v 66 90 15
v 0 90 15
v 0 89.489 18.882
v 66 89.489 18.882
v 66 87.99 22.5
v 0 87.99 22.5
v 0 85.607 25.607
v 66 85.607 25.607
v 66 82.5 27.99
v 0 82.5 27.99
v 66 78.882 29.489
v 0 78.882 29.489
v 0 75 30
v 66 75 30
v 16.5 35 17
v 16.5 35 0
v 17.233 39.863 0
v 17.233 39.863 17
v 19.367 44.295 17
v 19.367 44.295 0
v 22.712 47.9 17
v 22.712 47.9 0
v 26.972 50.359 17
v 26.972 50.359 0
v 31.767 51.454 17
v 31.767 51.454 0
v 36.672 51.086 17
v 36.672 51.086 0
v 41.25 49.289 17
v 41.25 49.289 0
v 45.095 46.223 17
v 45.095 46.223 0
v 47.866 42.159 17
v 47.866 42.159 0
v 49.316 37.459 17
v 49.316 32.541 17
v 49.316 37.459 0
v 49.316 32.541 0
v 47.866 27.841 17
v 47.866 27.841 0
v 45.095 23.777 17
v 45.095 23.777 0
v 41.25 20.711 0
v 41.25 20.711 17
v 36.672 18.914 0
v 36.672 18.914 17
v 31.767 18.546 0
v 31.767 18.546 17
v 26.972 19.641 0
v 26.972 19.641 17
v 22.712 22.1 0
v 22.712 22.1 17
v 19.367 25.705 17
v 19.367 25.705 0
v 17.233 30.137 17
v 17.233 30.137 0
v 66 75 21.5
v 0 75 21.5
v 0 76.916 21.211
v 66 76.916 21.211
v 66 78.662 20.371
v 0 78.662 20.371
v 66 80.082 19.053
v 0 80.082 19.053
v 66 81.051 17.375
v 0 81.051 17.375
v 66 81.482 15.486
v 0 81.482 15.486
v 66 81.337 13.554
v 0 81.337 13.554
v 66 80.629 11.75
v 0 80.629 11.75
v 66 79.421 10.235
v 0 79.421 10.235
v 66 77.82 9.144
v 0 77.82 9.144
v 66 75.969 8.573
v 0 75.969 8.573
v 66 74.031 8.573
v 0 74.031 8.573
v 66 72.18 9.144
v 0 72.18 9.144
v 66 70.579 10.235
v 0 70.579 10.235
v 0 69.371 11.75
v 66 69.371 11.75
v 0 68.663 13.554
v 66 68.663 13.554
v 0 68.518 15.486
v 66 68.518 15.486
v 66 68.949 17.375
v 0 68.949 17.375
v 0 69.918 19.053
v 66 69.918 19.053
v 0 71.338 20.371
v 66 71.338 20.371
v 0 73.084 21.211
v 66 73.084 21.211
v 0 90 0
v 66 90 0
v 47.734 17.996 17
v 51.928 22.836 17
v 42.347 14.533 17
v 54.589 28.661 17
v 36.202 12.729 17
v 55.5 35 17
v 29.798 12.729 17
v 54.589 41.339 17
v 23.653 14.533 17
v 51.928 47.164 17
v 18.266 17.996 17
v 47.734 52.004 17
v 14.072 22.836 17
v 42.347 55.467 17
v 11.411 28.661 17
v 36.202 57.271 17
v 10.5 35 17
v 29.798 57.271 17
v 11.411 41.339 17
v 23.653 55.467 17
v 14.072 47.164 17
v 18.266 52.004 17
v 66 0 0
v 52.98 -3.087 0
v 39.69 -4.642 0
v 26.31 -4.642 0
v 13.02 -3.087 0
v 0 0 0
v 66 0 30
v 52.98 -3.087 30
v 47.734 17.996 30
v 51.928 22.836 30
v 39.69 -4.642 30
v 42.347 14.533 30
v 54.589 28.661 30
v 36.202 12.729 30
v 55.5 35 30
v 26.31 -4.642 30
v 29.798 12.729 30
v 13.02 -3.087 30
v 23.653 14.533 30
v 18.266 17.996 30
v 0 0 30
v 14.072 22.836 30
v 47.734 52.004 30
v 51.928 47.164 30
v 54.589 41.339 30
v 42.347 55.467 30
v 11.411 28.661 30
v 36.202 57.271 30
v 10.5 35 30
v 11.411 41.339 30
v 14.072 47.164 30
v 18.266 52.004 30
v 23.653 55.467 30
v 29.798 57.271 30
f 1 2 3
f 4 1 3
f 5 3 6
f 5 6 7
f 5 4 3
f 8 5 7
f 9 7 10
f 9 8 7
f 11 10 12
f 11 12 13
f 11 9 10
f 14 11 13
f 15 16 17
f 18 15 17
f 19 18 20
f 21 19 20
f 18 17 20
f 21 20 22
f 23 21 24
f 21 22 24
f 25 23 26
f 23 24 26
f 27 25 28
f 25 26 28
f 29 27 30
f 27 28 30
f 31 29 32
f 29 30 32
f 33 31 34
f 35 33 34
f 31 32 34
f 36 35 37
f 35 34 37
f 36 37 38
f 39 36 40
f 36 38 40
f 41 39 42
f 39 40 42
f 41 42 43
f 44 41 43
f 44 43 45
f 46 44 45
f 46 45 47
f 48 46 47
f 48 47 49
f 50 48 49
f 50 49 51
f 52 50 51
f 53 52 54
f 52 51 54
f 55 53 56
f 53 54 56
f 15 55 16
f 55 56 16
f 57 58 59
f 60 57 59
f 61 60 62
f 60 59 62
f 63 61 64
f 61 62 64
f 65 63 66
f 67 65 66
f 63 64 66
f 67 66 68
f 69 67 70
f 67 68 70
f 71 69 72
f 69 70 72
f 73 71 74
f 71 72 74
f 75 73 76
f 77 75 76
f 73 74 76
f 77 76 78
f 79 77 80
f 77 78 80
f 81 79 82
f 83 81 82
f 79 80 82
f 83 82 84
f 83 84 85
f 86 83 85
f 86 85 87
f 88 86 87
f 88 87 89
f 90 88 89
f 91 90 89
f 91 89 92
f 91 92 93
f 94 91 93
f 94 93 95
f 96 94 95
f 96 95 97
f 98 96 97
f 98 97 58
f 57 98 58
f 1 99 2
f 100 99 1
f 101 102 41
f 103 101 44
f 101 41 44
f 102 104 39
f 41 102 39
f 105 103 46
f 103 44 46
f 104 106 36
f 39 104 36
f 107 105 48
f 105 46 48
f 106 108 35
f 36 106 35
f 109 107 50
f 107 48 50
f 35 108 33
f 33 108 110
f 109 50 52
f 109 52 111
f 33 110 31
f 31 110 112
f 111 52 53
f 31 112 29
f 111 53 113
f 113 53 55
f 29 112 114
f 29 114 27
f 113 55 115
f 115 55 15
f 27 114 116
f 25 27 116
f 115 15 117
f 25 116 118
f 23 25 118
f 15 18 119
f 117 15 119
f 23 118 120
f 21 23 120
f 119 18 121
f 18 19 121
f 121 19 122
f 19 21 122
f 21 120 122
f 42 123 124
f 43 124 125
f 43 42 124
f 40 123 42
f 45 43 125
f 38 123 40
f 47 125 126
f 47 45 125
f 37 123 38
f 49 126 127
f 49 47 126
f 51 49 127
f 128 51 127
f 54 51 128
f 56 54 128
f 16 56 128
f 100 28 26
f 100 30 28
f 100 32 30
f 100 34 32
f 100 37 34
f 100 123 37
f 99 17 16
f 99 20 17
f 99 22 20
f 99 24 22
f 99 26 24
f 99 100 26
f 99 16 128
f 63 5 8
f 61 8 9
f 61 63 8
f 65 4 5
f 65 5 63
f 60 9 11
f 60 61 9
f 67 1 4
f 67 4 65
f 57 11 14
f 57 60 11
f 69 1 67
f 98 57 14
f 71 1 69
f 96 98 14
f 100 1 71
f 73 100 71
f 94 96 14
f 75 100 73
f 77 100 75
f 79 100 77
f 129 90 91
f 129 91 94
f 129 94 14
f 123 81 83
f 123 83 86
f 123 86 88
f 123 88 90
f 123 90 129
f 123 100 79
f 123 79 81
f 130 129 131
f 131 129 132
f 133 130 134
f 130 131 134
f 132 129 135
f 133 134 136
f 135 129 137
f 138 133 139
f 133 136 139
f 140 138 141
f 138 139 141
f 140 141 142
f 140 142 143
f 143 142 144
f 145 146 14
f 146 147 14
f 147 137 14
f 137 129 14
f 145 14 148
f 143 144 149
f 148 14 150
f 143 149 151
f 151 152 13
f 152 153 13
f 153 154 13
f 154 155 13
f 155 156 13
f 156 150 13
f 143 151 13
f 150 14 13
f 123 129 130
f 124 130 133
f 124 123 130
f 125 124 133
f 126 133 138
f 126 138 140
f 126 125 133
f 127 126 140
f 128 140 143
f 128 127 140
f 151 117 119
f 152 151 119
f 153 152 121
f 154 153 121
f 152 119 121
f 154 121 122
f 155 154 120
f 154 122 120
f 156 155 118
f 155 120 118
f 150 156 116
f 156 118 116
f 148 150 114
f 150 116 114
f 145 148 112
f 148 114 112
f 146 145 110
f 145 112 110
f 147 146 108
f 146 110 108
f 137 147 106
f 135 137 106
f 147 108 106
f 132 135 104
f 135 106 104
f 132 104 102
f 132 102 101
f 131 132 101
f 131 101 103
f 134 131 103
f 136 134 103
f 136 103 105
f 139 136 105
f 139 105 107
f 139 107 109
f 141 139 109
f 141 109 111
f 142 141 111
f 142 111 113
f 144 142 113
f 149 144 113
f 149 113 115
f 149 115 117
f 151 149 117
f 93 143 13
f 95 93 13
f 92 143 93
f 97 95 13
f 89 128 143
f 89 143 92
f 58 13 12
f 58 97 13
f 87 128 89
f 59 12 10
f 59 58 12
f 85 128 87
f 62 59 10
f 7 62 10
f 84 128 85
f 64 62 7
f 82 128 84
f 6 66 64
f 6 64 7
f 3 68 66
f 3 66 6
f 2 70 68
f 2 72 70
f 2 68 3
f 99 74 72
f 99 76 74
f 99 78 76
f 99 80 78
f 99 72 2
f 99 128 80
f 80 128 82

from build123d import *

# Parameters (mm, degrees)
BOSS_EXTRUDE1_DEPTH = 30
SKETCH2_R           = 16.5
CUT_EXTRUDE1_DEPTH  = 17
CUT_EXTRUDE2_REACH  = 15
SKETCH3_R           = 22.5
FILLET2_R           = 15
CUT_EXTRUDE3_REACH  = 68
SKETCH4_R           = 6.5


with BuildPart() as part:
    # Sketch1 → Boss-Extrude1 (new body)
    with BuildSketch(Plane.XY):
        with BuildLine():
            Line((0, 0), (0, 90))
            Line((0, 90), (66, 90))
            Line((66, 90), (66, 0))
            ThreePointArc((66, 0), (33, -4.836485169), (0, 0))
        make_face()
    extrude(amount=BOSS_EXTRUDE1_DEPTH)

    # Sketch2 → Cut-Extrude1 (cut)
    with BuildSketch(Plane(origin=(0, 0, 0), x_dir=(-1, 0, 0), z_dir=(0, 0, -1))):
        with Locations((-33, 35)):
            Circle(SKETCH2_R)
    extrude(amount=-CUT_EXTRUDE1_DEPTH, mode=Mode.SUBTRACT)

    # Sketch3 → Cut-Extrude2 (cut, up to next)
    with BuildSketch(Plane(origin=(0, 0, 17), x_dir=(-1, 0, 0), z_dir=(0, 0, -1)), mode=Mode.PRIVATE) as cut_extrude2_sk1:
        with Locations((-33, 35)):
            Circle(SKETCH3_R)
    cut_extrude2_tool1 = extrude(cut_extrude2_sk1.sketch, amount=-CUT_EXTRUDE2_REACH, mode=Mode.PRIVATE) & part.part
    add(cut_extrude2_tool1.solids().sort_by_distance((33, 35, 17))[0], mode=Mode.SUBTRACT)

    # Fillet2
    fillet2_edges = [part.edges().sort_by_distance(p)[0] for p in [
        (33, 90, 30),
    ]]
    fillet(fillet2_edges, radius=FILLET2_R)

    # Sketch4 → Cut-Extrude3 (cut, up to next)
    with BuildSketch(Plane.ZY, mode=Mode.PRIVATE) as cut_extrude3_sk1:
        with Locations((15, 75)):
            Circle(SKETCH4_R)
    cut_extrude3_tool1 = extrude(cut_extrude3_sk1.sketch, amount=-CUT_EXTRUDE3_REACH, mode=Mode.PRIVATE) & part.part
    add(cut_extrude3_tool1.solids().sort_by_distance((0, 75, 15))[0], mode=Mode.SUBTRACT)


solid = part.part
